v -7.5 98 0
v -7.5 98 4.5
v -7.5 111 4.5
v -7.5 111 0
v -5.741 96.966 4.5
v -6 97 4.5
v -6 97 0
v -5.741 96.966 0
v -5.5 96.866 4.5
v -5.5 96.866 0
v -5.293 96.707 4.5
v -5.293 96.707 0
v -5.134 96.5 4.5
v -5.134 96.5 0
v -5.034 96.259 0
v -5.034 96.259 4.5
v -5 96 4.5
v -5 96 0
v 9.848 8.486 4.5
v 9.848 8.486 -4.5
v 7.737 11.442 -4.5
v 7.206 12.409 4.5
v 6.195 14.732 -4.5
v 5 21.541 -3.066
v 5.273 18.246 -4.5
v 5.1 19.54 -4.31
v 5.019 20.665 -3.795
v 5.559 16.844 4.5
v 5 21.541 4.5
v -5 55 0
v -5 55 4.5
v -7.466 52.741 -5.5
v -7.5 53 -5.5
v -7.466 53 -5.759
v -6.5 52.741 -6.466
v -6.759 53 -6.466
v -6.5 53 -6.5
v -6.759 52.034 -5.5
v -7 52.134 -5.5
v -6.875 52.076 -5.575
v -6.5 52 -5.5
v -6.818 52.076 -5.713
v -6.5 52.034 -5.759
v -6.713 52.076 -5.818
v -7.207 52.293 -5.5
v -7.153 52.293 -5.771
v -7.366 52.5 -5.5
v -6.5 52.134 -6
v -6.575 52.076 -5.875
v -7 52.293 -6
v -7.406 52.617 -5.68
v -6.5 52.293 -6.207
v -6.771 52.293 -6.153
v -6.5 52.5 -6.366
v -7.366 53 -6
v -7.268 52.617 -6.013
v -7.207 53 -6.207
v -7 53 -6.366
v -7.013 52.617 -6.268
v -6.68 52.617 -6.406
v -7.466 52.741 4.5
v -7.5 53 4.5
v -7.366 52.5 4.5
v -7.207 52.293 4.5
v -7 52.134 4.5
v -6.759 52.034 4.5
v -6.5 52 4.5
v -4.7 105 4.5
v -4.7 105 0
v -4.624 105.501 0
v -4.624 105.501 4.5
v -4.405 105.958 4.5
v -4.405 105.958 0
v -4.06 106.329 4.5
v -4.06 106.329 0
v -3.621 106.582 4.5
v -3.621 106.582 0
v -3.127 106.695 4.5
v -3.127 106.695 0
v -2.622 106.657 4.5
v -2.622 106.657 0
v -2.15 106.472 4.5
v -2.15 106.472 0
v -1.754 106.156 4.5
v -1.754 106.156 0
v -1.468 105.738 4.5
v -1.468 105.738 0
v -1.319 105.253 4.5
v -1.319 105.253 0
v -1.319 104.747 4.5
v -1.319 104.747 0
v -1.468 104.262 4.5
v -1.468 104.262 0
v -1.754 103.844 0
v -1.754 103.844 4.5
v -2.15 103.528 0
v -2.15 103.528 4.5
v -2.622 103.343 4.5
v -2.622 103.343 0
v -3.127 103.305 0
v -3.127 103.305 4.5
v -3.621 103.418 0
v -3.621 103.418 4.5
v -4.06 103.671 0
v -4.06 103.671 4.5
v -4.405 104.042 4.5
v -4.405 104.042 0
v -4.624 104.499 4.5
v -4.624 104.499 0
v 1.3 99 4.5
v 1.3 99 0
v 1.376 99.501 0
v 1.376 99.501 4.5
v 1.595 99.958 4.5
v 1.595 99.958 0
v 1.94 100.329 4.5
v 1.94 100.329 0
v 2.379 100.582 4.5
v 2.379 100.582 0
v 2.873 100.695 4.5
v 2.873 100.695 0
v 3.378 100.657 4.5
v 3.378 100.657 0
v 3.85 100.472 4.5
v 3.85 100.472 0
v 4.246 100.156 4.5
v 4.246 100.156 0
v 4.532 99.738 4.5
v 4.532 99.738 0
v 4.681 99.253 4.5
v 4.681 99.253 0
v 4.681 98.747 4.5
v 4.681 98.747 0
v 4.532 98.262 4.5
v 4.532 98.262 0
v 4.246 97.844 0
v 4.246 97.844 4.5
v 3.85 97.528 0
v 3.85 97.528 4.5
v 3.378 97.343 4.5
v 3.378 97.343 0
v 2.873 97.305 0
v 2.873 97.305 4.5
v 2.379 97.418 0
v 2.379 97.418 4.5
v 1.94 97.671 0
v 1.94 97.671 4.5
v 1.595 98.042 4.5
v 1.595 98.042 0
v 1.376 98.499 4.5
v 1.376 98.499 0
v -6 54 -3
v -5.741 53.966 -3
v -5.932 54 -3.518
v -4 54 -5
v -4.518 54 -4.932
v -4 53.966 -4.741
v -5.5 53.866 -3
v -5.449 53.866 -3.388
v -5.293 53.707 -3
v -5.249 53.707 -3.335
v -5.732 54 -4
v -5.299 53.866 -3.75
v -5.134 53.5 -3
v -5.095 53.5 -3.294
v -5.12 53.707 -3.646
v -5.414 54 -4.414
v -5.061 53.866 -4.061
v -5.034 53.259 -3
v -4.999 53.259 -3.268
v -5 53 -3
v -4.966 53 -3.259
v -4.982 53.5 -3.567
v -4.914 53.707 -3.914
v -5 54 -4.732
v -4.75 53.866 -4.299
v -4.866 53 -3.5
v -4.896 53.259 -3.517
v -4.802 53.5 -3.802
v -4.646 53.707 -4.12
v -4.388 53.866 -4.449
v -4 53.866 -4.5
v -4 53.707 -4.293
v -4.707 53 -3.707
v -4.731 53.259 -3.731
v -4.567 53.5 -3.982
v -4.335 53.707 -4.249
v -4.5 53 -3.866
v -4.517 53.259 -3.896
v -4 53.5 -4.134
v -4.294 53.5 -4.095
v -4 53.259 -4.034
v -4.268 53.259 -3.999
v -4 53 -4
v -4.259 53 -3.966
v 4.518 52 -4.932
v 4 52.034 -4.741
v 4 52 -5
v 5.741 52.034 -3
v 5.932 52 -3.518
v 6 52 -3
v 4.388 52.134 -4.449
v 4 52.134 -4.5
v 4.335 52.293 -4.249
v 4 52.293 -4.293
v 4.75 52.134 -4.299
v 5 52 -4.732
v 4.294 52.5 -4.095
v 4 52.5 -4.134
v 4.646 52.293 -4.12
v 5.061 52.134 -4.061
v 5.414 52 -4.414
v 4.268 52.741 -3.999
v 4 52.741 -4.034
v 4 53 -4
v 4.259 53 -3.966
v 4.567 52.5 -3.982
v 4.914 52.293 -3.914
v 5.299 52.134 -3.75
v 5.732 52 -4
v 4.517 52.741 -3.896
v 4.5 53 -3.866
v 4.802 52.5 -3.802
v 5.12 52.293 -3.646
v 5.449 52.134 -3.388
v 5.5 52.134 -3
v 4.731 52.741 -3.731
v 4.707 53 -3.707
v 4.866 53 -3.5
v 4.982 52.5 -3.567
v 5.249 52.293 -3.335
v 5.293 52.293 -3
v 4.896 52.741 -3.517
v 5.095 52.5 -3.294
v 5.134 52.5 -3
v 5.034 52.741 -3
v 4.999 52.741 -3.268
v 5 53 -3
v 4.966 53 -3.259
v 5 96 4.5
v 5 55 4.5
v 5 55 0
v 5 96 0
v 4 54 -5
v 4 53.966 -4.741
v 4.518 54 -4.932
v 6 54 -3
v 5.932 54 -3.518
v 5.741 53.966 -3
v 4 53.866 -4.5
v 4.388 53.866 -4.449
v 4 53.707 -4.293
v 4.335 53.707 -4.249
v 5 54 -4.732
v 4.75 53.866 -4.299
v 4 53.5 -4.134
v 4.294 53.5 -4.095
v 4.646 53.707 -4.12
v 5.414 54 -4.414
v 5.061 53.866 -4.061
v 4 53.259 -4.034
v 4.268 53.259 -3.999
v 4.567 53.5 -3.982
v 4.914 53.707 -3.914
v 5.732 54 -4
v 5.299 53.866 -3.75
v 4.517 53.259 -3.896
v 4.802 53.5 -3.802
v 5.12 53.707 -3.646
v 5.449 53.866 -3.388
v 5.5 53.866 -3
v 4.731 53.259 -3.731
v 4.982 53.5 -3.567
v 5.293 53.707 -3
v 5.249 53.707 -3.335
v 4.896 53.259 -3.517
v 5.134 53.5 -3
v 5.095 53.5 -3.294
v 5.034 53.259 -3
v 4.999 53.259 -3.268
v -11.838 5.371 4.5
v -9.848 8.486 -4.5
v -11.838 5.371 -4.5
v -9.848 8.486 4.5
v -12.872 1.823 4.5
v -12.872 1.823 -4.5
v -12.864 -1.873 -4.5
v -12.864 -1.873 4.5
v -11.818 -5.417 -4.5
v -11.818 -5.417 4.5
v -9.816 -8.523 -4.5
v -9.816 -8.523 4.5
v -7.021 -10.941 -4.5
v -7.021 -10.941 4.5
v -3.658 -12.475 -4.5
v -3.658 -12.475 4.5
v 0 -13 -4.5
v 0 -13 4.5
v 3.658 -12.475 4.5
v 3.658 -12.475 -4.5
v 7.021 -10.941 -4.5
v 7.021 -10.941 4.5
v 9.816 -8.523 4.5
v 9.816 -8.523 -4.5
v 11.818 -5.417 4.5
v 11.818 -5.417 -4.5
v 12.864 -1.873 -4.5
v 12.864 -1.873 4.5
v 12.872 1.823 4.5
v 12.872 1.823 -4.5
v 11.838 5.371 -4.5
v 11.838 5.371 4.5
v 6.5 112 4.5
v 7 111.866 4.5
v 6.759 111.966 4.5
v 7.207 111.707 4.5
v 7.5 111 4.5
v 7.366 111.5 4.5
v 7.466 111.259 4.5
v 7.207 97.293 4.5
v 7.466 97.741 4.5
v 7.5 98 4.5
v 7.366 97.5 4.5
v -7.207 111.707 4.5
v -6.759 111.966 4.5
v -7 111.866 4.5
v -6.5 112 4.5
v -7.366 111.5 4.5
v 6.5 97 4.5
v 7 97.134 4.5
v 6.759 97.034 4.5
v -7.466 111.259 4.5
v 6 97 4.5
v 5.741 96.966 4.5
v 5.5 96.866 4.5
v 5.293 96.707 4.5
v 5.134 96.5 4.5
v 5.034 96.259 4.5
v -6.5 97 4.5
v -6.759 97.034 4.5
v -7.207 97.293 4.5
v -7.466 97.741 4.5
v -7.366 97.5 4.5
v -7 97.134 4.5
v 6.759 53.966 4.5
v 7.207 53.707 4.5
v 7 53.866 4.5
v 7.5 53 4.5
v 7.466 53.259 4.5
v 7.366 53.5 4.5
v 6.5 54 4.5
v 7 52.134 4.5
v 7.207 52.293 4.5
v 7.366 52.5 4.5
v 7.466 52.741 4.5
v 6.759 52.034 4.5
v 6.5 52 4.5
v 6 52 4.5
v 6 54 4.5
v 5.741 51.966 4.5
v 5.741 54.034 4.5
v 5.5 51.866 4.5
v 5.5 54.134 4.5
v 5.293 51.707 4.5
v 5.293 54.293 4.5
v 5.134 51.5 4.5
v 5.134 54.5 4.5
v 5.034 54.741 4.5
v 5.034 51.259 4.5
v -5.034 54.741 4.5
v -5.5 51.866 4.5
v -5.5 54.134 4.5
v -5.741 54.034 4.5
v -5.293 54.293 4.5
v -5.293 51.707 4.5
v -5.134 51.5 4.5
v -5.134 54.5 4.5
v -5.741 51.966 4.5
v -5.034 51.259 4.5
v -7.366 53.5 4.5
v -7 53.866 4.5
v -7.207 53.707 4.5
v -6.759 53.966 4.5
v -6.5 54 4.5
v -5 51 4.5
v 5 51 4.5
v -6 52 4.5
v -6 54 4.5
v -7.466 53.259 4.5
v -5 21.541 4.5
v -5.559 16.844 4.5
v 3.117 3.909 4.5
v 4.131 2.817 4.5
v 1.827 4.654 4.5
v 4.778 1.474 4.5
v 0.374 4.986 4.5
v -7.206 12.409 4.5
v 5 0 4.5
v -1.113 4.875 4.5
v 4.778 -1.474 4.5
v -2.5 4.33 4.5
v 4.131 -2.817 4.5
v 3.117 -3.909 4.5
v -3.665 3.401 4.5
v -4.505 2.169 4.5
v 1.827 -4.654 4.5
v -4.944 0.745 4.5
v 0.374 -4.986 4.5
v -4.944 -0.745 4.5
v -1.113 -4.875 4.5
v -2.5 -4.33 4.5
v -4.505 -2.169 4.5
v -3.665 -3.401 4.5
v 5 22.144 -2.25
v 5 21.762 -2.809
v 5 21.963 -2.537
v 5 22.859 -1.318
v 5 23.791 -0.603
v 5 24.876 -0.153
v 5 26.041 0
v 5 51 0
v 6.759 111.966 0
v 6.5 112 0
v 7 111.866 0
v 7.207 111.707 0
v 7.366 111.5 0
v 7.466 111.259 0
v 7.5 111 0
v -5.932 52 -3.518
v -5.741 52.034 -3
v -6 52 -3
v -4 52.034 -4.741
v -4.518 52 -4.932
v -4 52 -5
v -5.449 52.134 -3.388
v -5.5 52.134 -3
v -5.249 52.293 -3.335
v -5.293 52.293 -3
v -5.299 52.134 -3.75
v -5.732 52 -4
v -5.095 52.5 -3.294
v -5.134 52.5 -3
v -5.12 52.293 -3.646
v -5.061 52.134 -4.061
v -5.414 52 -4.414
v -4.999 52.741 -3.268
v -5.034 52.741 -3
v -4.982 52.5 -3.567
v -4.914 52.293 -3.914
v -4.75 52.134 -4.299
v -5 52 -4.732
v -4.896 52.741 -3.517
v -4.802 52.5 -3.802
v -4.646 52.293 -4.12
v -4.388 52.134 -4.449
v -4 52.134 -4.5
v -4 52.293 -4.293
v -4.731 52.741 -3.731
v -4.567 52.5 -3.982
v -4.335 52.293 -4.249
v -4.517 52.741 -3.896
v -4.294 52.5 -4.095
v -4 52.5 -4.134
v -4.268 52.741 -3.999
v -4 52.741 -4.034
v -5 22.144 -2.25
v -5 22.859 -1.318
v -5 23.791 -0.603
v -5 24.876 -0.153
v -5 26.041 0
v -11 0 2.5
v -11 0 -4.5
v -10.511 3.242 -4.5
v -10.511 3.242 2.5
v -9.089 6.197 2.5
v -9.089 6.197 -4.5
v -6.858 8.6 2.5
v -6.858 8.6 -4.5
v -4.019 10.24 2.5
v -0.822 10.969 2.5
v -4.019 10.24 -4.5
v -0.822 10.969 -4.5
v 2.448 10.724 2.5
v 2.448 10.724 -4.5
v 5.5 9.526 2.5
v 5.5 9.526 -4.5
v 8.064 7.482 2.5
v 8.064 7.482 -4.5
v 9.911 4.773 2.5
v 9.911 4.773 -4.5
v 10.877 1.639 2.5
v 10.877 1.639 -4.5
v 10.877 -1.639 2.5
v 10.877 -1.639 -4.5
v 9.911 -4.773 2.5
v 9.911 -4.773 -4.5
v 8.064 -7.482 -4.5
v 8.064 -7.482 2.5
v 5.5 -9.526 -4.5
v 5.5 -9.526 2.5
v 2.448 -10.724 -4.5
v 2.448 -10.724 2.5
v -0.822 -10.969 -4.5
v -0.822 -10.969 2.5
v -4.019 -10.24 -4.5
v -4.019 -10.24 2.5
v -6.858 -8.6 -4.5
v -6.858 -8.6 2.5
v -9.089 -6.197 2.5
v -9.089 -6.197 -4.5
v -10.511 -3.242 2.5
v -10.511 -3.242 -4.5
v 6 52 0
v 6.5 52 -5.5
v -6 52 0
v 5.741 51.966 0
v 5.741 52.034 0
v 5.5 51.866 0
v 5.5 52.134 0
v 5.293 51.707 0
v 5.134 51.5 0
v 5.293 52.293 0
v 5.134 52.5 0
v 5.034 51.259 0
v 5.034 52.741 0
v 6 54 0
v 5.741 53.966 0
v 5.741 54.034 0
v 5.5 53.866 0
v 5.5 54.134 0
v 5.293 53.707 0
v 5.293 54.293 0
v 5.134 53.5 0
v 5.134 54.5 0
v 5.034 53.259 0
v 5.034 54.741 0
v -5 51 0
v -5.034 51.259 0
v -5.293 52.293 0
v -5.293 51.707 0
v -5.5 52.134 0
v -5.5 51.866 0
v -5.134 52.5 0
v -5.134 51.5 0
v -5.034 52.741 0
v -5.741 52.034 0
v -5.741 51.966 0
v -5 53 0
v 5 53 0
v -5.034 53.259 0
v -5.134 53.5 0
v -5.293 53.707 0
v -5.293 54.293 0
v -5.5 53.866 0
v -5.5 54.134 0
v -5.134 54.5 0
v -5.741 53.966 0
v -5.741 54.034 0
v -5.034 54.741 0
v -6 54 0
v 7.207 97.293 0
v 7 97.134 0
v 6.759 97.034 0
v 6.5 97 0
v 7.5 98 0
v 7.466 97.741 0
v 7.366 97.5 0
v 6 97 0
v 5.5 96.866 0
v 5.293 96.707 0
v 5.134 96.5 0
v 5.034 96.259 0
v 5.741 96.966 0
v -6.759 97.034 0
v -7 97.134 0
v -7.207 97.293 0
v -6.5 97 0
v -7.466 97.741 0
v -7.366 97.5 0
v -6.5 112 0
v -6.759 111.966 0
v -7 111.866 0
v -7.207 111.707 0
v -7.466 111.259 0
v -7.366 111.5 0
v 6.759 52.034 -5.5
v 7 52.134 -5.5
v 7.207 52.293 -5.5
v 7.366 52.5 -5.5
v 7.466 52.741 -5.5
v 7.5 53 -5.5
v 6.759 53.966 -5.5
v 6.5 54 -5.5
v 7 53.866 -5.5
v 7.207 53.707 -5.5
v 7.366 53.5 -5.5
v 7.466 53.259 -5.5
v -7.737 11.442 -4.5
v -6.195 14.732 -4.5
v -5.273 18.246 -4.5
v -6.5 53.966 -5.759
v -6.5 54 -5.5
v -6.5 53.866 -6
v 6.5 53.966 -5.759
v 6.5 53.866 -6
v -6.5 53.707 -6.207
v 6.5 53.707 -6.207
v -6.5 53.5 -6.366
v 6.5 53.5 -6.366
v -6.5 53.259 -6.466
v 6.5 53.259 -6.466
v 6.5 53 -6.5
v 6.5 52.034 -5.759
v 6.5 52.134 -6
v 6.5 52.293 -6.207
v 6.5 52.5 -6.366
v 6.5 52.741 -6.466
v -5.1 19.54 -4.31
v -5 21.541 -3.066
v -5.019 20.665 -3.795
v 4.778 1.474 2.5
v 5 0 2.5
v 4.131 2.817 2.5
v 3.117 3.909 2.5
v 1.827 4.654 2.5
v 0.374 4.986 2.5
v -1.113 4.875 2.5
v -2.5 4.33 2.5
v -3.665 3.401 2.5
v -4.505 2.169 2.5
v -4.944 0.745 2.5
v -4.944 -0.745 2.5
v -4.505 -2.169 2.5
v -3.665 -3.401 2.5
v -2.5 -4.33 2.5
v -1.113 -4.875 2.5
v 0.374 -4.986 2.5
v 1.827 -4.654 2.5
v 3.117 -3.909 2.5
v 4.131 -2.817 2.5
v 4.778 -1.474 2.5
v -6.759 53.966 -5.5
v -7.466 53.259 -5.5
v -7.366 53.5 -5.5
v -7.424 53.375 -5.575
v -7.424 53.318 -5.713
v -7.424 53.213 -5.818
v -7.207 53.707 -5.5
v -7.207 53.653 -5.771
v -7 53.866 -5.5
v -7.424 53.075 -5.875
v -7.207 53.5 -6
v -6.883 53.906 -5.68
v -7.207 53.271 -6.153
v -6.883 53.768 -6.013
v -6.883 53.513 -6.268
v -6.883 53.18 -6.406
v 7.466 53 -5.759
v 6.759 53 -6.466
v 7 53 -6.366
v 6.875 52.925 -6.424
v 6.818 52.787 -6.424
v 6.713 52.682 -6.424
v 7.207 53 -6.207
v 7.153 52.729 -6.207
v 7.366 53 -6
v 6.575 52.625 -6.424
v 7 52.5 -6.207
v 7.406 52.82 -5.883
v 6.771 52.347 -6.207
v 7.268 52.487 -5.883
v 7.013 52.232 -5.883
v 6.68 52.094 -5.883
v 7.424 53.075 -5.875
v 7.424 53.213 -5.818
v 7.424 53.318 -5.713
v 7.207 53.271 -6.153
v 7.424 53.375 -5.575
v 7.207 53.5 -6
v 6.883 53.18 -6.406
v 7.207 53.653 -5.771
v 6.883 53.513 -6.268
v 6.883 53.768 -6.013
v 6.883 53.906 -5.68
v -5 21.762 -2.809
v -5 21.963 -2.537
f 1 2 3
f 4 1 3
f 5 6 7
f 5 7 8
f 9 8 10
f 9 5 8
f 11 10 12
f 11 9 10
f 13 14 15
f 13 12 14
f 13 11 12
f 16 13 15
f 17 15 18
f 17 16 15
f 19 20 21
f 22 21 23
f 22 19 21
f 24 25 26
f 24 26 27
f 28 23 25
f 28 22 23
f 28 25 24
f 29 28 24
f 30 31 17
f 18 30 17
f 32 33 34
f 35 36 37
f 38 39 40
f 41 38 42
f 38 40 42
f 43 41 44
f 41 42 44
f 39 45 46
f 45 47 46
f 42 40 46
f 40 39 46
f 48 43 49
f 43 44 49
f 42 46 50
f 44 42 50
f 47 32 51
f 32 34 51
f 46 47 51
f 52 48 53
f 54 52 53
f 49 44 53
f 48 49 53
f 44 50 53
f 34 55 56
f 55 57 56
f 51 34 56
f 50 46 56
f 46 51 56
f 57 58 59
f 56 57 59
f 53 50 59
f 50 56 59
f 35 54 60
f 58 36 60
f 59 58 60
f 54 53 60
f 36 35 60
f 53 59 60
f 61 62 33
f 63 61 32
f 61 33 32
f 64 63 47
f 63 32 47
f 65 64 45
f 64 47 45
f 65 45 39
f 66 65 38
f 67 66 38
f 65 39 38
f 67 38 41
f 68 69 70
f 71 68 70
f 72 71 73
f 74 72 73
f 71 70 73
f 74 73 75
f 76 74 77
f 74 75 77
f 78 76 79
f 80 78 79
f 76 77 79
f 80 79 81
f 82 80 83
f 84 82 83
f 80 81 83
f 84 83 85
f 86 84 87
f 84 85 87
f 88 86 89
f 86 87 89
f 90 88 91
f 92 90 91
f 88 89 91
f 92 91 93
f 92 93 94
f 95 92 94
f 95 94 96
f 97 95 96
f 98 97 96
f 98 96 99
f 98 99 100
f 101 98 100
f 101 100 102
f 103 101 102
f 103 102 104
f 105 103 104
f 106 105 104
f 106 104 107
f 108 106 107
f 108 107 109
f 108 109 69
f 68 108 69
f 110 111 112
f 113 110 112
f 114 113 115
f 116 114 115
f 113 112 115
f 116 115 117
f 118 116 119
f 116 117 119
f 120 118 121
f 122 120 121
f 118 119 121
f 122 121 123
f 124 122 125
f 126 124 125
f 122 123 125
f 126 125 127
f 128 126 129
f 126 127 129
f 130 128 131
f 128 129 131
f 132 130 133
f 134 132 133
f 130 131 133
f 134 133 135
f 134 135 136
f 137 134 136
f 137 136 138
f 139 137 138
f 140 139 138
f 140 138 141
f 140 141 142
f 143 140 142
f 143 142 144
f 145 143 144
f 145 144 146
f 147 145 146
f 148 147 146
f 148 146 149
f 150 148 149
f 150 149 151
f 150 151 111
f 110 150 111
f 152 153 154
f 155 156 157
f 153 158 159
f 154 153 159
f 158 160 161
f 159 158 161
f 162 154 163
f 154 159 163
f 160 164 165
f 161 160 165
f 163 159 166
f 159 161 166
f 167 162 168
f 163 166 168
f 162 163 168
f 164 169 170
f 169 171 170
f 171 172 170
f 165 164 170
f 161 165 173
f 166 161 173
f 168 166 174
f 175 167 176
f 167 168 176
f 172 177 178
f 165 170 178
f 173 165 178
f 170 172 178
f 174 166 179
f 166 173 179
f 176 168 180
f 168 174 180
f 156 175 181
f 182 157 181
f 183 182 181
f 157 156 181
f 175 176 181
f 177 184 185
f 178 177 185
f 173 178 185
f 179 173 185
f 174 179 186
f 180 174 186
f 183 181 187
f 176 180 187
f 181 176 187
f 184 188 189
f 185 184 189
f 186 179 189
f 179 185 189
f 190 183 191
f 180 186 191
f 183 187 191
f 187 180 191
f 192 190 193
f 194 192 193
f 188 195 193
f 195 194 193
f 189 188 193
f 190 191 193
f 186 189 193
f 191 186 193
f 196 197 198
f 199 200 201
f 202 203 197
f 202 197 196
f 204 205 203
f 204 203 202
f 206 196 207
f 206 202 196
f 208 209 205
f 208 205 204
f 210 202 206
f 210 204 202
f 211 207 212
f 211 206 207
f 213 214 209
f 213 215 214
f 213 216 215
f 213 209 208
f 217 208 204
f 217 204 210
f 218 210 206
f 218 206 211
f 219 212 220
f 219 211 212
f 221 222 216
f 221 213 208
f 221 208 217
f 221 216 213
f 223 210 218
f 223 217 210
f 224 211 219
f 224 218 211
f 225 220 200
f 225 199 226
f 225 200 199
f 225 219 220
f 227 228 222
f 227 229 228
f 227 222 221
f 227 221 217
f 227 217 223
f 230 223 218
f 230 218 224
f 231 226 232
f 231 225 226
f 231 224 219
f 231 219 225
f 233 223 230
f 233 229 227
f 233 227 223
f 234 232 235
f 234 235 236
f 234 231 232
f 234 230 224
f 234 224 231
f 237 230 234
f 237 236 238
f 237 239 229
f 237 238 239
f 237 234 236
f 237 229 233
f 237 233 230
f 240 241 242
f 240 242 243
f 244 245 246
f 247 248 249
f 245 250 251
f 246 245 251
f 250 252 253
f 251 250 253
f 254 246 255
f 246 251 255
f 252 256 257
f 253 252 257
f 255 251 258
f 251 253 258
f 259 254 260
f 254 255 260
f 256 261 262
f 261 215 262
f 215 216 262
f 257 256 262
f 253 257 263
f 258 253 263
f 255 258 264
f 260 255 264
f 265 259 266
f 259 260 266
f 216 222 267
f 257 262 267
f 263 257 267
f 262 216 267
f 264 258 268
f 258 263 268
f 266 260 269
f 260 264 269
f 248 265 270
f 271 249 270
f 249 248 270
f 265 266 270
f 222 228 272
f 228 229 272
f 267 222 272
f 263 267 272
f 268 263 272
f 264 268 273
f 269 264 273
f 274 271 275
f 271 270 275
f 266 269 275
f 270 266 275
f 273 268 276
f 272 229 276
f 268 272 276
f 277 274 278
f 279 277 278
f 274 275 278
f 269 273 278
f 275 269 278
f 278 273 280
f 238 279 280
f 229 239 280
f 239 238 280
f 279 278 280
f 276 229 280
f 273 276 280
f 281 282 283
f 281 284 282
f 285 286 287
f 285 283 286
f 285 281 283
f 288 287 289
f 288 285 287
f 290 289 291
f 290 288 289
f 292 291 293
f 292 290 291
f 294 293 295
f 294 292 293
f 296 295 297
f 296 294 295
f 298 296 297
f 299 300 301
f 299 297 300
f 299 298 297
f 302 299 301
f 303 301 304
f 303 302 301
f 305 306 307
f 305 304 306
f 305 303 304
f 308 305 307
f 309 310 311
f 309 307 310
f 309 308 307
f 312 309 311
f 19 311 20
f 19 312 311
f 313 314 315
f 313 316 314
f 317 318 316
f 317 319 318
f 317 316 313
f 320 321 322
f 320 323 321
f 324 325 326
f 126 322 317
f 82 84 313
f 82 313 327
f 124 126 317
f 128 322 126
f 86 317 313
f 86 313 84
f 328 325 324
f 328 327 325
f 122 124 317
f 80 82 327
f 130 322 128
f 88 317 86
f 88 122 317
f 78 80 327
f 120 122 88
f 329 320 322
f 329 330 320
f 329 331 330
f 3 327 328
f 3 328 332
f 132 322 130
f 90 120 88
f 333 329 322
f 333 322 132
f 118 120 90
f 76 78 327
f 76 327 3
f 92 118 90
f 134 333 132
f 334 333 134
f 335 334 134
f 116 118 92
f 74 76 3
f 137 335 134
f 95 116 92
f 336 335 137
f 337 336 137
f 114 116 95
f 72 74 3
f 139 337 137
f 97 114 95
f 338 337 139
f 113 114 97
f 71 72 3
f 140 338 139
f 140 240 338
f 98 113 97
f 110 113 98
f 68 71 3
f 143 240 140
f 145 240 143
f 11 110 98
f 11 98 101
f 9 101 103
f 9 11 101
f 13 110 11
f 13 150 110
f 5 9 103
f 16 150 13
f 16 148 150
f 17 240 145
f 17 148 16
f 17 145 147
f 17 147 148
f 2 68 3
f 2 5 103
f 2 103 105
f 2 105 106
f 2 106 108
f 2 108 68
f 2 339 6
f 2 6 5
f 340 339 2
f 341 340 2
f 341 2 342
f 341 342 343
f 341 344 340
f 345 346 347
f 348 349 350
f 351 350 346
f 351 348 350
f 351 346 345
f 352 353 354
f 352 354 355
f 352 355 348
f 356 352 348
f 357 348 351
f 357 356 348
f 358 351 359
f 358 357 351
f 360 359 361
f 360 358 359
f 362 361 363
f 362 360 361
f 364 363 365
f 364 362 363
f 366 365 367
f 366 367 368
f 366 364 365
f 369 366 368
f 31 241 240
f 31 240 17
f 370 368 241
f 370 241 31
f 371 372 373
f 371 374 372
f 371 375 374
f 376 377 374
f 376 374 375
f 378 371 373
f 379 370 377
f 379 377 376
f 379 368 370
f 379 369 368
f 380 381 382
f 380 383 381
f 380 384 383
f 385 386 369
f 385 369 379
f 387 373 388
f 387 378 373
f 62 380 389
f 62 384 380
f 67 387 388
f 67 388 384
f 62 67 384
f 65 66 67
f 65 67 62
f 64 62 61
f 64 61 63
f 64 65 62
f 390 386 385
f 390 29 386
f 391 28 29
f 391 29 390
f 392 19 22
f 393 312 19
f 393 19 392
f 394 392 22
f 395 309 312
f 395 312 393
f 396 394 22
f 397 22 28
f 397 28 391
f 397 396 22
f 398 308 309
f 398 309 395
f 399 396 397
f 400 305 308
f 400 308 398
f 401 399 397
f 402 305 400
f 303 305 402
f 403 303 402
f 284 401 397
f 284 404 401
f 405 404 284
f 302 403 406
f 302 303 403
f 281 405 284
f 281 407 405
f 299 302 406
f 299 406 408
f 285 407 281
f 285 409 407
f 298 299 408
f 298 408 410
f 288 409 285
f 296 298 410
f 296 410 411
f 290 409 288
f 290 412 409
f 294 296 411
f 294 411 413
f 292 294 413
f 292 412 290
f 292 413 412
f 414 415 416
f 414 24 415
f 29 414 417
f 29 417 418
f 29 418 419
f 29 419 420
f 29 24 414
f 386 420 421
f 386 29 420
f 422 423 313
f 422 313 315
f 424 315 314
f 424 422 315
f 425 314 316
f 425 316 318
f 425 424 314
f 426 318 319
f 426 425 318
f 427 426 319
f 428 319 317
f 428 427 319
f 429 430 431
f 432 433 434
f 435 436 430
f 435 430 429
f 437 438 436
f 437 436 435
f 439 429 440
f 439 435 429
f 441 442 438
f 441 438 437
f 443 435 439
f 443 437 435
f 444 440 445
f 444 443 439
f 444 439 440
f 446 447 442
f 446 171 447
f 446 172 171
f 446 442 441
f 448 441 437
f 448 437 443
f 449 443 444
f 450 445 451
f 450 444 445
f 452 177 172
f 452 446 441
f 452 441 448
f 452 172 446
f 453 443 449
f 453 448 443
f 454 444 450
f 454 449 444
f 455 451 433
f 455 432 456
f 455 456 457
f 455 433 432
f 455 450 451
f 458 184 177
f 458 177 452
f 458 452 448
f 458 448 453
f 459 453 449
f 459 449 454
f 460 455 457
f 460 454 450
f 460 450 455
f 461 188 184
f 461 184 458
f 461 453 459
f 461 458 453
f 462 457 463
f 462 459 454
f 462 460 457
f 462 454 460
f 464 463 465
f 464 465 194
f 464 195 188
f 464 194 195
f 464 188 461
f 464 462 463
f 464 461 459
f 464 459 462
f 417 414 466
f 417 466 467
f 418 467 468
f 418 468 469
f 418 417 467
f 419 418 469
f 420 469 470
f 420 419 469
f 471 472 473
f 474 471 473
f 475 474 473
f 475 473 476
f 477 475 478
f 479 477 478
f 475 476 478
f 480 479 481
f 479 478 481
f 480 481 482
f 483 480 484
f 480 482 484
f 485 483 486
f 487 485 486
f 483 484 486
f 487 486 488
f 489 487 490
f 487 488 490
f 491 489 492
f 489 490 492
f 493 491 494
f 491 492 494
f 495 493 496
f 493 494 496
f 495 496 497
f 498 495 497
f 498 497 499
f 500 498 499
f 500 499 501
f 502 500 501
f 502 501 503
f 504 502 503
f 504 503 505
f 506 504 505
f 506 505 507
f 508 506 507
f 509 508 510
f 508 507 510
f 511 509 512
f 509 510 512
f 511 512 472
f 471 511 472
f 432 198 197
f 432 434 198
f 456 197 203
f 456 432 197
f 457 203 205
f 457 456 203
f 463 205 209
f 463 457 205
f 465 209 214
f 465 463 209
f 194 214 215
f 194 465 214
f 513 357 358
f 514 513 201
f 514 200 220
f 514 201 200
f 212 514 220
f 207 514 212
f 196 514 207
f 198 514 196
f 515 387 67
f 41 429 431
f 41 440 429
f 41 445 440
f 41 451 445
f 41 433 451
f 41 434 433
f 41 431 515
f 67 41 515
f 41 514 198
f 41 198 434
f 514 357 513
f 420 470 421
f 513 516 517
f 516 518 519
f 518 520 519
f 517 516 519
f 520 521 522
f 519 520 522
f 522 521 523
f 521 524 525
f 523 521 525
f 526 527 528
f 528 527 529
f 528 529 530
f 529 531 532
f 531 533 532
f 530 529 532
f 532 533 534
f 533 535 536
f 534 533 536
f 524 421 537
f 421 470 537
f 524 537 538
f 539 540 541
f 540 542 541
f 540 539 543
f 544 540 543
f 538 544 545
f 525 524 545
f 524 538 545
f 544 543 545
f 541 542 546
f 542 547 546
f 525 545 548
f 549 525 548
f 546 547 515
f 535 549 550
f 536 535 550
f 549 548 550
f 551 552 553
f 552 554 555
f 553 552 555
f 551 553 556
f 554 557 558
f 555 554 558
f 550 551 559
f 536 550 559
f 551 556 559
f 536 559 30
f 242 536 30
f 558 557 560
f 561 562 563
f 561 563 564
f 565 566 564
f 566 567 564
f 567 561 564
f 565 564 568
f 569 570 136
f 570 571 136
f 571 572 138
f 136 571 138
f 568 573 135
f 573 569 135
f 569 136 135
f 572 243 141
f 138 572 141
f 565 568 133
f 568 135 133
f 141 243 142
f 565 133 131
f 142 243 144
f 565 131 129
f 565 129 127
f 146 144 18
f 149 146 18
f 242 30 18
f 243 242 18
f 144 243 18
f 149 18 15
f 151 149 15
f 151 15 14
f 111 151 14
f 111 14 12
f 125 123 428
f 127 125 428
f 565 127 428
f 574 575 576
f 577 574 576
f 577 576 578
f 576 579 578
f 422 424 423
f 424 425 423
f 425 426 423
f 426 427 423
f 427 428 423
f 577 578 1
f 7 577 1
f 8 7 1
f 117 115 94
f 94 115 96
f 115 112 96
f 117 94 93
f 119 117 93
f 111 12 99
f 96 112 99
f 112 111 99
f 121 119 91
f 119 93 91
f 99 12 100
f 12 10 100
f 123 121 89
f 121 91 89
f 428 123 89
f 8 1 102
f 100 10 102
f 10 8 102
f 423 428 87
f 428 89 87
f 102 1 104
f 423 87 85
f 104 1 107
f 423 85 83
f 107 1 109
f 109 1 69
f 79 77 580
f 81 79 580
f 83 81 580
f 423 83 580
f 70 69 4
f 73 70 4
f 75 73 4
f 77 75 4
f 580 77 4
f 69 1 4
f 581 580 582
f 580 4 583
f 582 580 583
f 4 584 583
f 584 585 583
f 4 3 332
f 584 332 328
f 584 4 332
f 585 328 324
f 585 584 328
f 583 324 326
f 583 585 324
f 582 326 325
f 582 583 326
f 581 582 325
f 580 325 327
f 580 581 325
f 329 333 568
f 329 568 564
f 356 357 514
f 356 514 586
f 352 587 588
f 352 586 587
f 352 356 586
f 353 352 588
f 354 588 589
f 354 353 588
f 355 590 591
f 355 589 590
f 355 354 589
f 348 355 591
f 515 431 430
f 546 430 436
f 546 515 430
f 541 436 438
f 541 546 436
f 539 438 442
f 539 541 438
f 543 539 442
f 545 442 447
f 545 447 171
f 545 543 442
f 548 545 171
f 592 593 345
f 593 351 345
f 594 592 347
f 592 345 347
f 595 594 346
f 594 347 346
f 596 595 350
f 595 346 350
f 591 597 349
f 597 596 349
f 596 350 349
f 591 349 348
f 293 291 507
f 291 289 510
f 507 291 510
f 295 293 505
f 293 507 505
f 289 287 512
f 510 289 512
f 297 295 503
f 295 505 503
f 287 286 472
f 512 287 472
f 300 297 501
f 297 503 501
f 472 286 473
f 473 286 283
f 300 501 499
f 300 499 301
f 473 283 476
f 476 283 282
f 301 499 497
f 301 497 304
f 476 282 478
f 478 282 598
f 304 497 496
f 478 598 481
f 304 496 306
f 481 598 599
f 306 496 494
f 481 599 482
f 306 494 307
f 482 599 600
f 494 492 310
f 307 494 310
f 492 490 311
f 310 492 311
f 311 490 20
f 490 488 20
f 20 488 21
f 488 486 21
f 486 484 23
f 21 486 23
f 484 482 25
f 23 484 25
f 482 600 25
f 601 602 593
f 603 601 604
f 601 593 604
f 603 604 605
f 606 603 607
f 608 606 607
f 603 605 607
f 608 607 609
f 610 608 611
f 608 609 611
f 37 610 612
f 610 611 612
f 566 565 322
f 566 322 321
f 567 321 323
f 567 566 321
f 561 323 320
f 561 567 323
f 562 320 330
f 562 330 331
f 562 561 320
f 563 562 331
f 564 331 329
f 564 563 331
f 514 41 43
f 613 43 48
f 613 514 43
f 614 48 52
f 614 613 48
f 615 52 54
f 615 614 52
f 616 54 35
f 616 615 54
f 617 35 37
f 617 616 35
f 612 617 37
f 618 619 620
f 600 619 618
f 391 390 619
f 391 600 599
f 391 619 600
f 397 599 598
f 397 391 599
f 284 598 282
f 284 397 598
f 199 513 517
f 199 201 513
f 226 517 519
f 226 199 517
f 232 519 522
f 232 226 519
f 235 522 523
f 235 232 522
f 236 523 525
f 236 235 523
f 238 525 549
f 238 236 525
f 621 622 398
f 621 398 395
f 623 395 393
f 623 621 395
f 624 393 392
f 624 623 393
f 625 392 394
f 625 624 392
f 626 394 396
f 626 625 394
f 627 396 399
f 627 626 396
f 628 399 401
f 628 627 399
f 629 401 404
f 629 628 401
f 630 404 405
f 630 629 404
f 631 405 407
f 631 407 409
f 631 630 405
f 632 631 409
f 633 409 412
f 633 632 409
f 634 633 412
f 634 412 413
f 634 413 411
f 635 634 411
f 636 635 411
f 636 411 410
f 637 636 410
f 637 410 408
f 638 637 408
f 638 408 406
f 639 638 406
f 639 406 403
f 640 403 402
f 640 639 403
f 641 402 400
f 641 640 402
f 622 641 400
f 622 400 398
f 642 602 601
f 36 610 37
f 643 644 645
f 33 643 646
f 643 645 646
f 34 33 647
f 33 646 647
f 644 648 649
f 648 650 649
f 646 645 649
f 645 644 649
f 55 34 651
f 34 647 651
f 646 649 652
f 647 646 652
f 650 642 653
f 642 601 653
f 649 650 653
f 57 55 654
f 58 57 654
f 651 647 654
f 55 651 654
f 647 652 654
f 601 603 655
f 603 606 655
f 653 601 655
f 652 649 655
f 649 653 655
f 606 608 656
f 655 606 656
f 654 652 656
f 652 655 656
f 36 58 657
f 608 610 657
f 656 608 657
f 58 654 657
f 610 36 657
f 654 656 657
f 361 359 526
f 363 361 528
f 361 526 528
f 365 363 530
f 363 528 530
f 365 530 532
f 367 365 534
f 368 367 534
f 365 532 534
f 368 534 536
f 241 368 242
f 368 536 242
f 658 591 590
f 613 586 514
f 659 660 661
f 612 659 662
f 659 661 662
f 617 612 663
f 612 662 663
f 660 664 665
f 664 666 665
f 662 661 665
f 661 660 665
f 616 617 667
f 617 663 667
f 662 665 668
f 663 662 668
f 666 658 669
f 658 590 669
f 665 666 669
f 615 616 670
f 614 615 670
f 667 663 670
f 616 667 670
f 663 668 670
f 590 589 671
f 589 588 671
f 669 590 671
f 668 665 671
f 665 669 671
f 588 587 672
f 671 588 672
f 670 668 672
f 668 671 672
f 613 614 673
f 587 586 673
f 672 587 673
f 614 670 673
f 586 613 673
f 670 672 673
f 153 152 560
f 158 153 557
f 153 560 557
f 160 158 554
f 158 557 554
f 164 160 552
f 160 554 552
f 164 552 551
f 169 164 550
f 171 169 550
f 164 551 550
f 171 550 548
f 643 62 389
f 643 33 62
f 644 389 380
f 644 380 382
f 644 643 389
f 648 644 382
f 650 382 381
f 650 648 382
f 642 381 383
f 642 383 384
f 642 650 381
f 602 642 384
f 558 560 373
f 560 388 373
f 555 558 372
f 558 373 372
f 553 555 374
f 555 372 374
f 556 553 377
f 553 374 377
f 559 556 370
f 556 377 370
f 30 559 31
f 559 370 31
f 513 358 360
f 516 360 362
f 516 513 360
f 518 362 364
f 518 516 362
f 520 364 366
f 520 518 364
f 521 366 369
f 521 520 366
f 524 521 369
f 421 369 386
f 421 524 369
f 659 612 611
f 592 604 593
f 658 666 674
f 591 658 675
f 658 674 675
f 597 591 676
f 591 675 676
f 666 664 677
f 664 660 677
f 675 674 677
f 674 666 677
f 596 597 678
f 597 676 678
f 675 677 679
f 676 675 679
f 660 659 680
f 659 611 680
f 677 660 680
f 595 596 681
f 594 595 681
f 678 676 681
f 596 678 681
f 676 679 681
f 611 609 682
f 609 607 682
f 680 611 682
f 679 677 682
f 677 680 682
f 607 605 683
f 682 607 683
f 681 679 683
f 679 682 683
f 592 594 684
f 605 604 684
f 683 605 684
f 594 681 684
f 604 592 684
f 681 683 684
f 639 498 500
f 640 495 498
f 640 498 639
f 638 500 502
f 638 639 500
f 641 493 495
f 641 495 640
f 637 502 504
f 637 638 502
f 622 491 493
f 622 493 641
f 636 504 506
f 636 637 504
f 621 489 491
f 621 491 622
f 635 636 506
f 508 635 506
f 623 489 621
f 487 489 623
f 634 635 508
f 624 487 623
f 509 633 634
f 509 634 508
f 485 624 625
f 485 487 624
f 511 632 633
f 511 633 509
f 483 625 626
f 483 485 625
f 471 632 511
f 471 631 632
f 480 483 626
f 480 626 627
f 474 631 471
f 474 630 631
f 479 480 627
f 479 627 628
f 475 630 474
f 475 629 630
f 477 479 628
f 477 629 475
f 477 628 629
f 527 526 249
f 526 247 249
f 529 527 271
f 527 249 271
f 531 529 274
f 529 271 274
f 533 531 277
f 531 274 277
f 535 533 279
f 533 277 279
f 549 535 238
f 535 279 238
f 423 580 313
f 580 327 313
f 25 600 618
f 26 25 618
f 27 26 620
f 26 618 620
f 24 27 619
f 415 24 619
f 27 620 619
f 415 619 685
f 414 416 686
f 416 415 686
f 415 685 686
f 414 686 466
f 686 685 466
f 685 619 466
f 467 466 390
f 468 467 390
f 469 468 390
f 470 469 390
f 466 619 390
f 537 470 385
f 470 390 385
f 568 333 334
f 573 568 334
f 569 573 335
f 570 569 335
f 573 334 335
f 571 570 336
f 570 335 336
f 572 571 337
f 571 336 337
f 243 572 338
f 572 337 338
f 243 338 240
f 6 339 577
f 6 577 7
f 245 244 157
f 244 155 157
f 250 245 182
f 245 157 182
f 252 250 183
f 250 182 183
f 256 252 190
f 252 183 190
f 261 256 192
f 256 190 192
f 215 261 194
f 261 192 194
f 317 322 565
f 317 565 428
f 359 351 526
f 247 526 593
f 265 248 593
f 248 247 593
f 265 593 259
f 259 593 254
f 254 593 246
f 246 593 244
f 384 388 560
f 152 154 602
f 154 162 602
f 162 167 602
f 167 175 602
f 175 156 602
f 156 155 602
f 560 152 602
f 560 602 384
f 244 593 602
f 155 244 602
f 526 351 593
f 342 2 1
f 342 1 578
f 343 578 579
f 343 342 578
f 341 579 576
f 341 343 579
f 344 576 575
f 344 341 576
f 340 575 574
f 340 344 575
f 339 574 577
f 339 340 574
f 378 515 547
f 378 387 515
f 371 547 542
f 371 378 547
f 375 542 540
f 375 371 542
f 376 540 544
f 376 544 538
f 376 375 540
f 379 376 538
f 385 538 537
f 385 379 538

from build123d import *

# Parameters (mm, degrees)
SKETCH1_R               = 13
SKETCH1_R_2             = 5
SKETCH1_W               = 10
SKETCH1_H               = 100
SKETCH1_W_2             = 15
SKETCH1_H_2             = 15
BOSS_EXTRUDE1_DEPTH     = 4.5
SKETCH2_R               = 11
CUT_EXTRUDE1_DEPTH      = 7
FILLET7_R               = 1
FILLET1_R               = 20
CUT_EXTRUDE2_DEPTH      = 113.841703284
CUT_EXTRUDE2_DEPTH_BACK = 113.841703284
SKETCH3_W               = 4.5
SKETCH3_H               = 90.459340771
M3_CLEARANCE_HOLE1_D    = 3.4
FILLET5_R               = 4.5
FILLET6_R               = 4.5
BOSS_EXTRUDE2_DEPTH     = 2
FILLET8_R               = 1
FILLET9_R               = 1


# Some blends are built 0.0001 mm under size
with BuildPart() as part:
    # Sketch1 → Boss-Extrude1 (new, symmetric)
    # profile 1 of 3: a face of its own
    with BuildSketch(Plane.XY):
        Circle(SKETCH1_R)
        Circle(SKETCH1_R_2, mode=Mode.SUBTRACT)
    # profile 2 of 3: a face of its own
    with BuildSketch(Plane.XY):
        with Locations((0, 62)):
            Rectangle(SKETCH1_W, SKETCH1_H)
    # profile 3 of 3: a face of its own
    with BuildSketch(Plane.XY):
        with Locations((0, 104.5)):
            Rectangle(SKETCH1_W_2, SKETCH1_H_2)
    extrude(amount=BOSS_EXTRUDE1_DEPTH, both=True)

    # Sketch2 → Cut-Extrude1 (cut)
    with BuildSketch(Plane(origin=(0, 0, -4.5), x_dir=(-1, 0, 0), z_dir=(0, 0, -1))):
        Circle(SKETCH2_R)
    extrude(amount=-CUT_EXTRUDE1_DEPTH, mode=Mode.SUBTRACT)

    # Fillet7
    fillet7_edges = [part.edges().sort_by_distance(p)[0] for p in [
        (-5, 97, 0),
        (5, 97, 0),
        (7.5, 97, 0),
        (7.5, 112, 0),
        (-7.5, 112, 0),
        (-7.5, 97, 0),
    ]]
    fillet(fillet7_edges, radius=FILLET7_R)

    # Fillet1
    fillet1_edges = [part.edges().sort_by_distance(p)[0] for p in [
        (-5, 12, 0),
        (5, 12, 0),
    ]]
    fillet(fillet1_edges, radius=FILLET1_R)

    # Sketch3 → Cut-Extrude2 (cut, two sides: drawn at the far end of the back side and taken through both)
    with BuildSketch(Plane(origin=(0, 0, 0), x_dir=(0, 0, -1), z_dir=(1, 0, 0)).offset(-CUT_EXTRUDE2_DEPTH_BACK)):
        with Locations((2.25, 66.770329614)):
            Rectangle(SKETCH3_W, SKETCH3_H)
    extrude(amount=CUT_EXTRUDE2_DEPTH + CUT_EXTRUDE2_DEPTH_BACK, mode=Mode.SUBTRACT)

    # M3 Clearance Hole1 (through all)
    with Locations(Plane.XY.offset(4.5)):
        with Locations((3, 99), (-3, 105)):
            Hole(M3_CLEARANCE_HOLE1_D / 2)

    # Fillet5
    fillet5_edges = [part.edges().sort_by_distance(p)[0] for p in [
        (0, 21.540659229, 0),
    ]]
    fillet(fillet5_edges, radius=FILLET5_R - 0.0001)  # a hair under: the kernel refuses the full size

    # Fillet6
    # the kernel refuses this fillet: 4.5 mm, written as the material it takes off along each edge
    with BuildSketch(Plane(origin=(-13.235677247, 21.540659229, -4.5), x_dir=(0, -1, 0), z_dir=(1, 0, 0))) as fillet6_piece_1:
        with BuildLine():
            CenterArc((3.294270899, -4.5), FILLET6_R, 90, 60.000367556)
            Line((-0.602857852, -2.250025), (-0.992570727, -2.0250275))
            ThreePointArc((-0.992570727, -2.0250275), (-0.45, -0.0001), (-0.45, 0))
            Line((-0.45, 0), (0, 0.45))
            Line((0, 0.45), (3.294270899, 0.45))
            Line((3.294270899, 0.45), (3.294270899, 0))
        make_face()
    extrude(amount=26.471354494, mode=Mode.SUBTRACT)

    # Sketch10 → Boss-Extrude2 (add)
    with BuildSketch(Plane(origin=(0, 52, 0), x_dir=(-1, 0, 0), z_dir=(0, -1, 0))):
        Polygon((5, -4.5), (7.5, -4.5), (7.5, 6.5), (-7.5, 6.5), (-7.5, -4.5), (-5, -4.5), (-5, 4), (5, 4), align=None)
    extrude(amount=-BOSS_EXTRUDE2_DEPTH)

    # Fillet8
    fillet8_edges = [part.edges().sort_by_distance(p)[0] for p in [
        (-5, 52, -2),
        (5, 54, -2),
        (5, 53, -4),
        (7.5, 52, -1),
        (0, 54, -6.5),
        (7.5, 53, -6.5),
        (-7.5, 54, -1),
        (-7.5, 53, -6.5),
        (0, 52, -4),
        (-5, 53, -4),
        (7.5, 54, -1),
        (-5, 54, -2),
        (0, 54, -4),
        (5, 52, -2),
        (-7.5, 52, -1),
        (0, 52, -6.5),
    ]]
    fillet(fillet8_edges, radius=FILLET8_R - 0.0001)  # a hair under: the kernel refuses the full size

    # Fillet9
    fillet9_edges = [part.edges().sort_by_distance(p)[0] for p in [
        (5, 54, 2.25),
        (-5, 54, 2.25),
        (-5, 52, 2.25),
        (5, 52, 2.25),
    ]]
    fillet(fillet9_edges, radius=FILLET9_R - 0.0001)  # a hair under: the kernel refuses the full size


solid = part.part
